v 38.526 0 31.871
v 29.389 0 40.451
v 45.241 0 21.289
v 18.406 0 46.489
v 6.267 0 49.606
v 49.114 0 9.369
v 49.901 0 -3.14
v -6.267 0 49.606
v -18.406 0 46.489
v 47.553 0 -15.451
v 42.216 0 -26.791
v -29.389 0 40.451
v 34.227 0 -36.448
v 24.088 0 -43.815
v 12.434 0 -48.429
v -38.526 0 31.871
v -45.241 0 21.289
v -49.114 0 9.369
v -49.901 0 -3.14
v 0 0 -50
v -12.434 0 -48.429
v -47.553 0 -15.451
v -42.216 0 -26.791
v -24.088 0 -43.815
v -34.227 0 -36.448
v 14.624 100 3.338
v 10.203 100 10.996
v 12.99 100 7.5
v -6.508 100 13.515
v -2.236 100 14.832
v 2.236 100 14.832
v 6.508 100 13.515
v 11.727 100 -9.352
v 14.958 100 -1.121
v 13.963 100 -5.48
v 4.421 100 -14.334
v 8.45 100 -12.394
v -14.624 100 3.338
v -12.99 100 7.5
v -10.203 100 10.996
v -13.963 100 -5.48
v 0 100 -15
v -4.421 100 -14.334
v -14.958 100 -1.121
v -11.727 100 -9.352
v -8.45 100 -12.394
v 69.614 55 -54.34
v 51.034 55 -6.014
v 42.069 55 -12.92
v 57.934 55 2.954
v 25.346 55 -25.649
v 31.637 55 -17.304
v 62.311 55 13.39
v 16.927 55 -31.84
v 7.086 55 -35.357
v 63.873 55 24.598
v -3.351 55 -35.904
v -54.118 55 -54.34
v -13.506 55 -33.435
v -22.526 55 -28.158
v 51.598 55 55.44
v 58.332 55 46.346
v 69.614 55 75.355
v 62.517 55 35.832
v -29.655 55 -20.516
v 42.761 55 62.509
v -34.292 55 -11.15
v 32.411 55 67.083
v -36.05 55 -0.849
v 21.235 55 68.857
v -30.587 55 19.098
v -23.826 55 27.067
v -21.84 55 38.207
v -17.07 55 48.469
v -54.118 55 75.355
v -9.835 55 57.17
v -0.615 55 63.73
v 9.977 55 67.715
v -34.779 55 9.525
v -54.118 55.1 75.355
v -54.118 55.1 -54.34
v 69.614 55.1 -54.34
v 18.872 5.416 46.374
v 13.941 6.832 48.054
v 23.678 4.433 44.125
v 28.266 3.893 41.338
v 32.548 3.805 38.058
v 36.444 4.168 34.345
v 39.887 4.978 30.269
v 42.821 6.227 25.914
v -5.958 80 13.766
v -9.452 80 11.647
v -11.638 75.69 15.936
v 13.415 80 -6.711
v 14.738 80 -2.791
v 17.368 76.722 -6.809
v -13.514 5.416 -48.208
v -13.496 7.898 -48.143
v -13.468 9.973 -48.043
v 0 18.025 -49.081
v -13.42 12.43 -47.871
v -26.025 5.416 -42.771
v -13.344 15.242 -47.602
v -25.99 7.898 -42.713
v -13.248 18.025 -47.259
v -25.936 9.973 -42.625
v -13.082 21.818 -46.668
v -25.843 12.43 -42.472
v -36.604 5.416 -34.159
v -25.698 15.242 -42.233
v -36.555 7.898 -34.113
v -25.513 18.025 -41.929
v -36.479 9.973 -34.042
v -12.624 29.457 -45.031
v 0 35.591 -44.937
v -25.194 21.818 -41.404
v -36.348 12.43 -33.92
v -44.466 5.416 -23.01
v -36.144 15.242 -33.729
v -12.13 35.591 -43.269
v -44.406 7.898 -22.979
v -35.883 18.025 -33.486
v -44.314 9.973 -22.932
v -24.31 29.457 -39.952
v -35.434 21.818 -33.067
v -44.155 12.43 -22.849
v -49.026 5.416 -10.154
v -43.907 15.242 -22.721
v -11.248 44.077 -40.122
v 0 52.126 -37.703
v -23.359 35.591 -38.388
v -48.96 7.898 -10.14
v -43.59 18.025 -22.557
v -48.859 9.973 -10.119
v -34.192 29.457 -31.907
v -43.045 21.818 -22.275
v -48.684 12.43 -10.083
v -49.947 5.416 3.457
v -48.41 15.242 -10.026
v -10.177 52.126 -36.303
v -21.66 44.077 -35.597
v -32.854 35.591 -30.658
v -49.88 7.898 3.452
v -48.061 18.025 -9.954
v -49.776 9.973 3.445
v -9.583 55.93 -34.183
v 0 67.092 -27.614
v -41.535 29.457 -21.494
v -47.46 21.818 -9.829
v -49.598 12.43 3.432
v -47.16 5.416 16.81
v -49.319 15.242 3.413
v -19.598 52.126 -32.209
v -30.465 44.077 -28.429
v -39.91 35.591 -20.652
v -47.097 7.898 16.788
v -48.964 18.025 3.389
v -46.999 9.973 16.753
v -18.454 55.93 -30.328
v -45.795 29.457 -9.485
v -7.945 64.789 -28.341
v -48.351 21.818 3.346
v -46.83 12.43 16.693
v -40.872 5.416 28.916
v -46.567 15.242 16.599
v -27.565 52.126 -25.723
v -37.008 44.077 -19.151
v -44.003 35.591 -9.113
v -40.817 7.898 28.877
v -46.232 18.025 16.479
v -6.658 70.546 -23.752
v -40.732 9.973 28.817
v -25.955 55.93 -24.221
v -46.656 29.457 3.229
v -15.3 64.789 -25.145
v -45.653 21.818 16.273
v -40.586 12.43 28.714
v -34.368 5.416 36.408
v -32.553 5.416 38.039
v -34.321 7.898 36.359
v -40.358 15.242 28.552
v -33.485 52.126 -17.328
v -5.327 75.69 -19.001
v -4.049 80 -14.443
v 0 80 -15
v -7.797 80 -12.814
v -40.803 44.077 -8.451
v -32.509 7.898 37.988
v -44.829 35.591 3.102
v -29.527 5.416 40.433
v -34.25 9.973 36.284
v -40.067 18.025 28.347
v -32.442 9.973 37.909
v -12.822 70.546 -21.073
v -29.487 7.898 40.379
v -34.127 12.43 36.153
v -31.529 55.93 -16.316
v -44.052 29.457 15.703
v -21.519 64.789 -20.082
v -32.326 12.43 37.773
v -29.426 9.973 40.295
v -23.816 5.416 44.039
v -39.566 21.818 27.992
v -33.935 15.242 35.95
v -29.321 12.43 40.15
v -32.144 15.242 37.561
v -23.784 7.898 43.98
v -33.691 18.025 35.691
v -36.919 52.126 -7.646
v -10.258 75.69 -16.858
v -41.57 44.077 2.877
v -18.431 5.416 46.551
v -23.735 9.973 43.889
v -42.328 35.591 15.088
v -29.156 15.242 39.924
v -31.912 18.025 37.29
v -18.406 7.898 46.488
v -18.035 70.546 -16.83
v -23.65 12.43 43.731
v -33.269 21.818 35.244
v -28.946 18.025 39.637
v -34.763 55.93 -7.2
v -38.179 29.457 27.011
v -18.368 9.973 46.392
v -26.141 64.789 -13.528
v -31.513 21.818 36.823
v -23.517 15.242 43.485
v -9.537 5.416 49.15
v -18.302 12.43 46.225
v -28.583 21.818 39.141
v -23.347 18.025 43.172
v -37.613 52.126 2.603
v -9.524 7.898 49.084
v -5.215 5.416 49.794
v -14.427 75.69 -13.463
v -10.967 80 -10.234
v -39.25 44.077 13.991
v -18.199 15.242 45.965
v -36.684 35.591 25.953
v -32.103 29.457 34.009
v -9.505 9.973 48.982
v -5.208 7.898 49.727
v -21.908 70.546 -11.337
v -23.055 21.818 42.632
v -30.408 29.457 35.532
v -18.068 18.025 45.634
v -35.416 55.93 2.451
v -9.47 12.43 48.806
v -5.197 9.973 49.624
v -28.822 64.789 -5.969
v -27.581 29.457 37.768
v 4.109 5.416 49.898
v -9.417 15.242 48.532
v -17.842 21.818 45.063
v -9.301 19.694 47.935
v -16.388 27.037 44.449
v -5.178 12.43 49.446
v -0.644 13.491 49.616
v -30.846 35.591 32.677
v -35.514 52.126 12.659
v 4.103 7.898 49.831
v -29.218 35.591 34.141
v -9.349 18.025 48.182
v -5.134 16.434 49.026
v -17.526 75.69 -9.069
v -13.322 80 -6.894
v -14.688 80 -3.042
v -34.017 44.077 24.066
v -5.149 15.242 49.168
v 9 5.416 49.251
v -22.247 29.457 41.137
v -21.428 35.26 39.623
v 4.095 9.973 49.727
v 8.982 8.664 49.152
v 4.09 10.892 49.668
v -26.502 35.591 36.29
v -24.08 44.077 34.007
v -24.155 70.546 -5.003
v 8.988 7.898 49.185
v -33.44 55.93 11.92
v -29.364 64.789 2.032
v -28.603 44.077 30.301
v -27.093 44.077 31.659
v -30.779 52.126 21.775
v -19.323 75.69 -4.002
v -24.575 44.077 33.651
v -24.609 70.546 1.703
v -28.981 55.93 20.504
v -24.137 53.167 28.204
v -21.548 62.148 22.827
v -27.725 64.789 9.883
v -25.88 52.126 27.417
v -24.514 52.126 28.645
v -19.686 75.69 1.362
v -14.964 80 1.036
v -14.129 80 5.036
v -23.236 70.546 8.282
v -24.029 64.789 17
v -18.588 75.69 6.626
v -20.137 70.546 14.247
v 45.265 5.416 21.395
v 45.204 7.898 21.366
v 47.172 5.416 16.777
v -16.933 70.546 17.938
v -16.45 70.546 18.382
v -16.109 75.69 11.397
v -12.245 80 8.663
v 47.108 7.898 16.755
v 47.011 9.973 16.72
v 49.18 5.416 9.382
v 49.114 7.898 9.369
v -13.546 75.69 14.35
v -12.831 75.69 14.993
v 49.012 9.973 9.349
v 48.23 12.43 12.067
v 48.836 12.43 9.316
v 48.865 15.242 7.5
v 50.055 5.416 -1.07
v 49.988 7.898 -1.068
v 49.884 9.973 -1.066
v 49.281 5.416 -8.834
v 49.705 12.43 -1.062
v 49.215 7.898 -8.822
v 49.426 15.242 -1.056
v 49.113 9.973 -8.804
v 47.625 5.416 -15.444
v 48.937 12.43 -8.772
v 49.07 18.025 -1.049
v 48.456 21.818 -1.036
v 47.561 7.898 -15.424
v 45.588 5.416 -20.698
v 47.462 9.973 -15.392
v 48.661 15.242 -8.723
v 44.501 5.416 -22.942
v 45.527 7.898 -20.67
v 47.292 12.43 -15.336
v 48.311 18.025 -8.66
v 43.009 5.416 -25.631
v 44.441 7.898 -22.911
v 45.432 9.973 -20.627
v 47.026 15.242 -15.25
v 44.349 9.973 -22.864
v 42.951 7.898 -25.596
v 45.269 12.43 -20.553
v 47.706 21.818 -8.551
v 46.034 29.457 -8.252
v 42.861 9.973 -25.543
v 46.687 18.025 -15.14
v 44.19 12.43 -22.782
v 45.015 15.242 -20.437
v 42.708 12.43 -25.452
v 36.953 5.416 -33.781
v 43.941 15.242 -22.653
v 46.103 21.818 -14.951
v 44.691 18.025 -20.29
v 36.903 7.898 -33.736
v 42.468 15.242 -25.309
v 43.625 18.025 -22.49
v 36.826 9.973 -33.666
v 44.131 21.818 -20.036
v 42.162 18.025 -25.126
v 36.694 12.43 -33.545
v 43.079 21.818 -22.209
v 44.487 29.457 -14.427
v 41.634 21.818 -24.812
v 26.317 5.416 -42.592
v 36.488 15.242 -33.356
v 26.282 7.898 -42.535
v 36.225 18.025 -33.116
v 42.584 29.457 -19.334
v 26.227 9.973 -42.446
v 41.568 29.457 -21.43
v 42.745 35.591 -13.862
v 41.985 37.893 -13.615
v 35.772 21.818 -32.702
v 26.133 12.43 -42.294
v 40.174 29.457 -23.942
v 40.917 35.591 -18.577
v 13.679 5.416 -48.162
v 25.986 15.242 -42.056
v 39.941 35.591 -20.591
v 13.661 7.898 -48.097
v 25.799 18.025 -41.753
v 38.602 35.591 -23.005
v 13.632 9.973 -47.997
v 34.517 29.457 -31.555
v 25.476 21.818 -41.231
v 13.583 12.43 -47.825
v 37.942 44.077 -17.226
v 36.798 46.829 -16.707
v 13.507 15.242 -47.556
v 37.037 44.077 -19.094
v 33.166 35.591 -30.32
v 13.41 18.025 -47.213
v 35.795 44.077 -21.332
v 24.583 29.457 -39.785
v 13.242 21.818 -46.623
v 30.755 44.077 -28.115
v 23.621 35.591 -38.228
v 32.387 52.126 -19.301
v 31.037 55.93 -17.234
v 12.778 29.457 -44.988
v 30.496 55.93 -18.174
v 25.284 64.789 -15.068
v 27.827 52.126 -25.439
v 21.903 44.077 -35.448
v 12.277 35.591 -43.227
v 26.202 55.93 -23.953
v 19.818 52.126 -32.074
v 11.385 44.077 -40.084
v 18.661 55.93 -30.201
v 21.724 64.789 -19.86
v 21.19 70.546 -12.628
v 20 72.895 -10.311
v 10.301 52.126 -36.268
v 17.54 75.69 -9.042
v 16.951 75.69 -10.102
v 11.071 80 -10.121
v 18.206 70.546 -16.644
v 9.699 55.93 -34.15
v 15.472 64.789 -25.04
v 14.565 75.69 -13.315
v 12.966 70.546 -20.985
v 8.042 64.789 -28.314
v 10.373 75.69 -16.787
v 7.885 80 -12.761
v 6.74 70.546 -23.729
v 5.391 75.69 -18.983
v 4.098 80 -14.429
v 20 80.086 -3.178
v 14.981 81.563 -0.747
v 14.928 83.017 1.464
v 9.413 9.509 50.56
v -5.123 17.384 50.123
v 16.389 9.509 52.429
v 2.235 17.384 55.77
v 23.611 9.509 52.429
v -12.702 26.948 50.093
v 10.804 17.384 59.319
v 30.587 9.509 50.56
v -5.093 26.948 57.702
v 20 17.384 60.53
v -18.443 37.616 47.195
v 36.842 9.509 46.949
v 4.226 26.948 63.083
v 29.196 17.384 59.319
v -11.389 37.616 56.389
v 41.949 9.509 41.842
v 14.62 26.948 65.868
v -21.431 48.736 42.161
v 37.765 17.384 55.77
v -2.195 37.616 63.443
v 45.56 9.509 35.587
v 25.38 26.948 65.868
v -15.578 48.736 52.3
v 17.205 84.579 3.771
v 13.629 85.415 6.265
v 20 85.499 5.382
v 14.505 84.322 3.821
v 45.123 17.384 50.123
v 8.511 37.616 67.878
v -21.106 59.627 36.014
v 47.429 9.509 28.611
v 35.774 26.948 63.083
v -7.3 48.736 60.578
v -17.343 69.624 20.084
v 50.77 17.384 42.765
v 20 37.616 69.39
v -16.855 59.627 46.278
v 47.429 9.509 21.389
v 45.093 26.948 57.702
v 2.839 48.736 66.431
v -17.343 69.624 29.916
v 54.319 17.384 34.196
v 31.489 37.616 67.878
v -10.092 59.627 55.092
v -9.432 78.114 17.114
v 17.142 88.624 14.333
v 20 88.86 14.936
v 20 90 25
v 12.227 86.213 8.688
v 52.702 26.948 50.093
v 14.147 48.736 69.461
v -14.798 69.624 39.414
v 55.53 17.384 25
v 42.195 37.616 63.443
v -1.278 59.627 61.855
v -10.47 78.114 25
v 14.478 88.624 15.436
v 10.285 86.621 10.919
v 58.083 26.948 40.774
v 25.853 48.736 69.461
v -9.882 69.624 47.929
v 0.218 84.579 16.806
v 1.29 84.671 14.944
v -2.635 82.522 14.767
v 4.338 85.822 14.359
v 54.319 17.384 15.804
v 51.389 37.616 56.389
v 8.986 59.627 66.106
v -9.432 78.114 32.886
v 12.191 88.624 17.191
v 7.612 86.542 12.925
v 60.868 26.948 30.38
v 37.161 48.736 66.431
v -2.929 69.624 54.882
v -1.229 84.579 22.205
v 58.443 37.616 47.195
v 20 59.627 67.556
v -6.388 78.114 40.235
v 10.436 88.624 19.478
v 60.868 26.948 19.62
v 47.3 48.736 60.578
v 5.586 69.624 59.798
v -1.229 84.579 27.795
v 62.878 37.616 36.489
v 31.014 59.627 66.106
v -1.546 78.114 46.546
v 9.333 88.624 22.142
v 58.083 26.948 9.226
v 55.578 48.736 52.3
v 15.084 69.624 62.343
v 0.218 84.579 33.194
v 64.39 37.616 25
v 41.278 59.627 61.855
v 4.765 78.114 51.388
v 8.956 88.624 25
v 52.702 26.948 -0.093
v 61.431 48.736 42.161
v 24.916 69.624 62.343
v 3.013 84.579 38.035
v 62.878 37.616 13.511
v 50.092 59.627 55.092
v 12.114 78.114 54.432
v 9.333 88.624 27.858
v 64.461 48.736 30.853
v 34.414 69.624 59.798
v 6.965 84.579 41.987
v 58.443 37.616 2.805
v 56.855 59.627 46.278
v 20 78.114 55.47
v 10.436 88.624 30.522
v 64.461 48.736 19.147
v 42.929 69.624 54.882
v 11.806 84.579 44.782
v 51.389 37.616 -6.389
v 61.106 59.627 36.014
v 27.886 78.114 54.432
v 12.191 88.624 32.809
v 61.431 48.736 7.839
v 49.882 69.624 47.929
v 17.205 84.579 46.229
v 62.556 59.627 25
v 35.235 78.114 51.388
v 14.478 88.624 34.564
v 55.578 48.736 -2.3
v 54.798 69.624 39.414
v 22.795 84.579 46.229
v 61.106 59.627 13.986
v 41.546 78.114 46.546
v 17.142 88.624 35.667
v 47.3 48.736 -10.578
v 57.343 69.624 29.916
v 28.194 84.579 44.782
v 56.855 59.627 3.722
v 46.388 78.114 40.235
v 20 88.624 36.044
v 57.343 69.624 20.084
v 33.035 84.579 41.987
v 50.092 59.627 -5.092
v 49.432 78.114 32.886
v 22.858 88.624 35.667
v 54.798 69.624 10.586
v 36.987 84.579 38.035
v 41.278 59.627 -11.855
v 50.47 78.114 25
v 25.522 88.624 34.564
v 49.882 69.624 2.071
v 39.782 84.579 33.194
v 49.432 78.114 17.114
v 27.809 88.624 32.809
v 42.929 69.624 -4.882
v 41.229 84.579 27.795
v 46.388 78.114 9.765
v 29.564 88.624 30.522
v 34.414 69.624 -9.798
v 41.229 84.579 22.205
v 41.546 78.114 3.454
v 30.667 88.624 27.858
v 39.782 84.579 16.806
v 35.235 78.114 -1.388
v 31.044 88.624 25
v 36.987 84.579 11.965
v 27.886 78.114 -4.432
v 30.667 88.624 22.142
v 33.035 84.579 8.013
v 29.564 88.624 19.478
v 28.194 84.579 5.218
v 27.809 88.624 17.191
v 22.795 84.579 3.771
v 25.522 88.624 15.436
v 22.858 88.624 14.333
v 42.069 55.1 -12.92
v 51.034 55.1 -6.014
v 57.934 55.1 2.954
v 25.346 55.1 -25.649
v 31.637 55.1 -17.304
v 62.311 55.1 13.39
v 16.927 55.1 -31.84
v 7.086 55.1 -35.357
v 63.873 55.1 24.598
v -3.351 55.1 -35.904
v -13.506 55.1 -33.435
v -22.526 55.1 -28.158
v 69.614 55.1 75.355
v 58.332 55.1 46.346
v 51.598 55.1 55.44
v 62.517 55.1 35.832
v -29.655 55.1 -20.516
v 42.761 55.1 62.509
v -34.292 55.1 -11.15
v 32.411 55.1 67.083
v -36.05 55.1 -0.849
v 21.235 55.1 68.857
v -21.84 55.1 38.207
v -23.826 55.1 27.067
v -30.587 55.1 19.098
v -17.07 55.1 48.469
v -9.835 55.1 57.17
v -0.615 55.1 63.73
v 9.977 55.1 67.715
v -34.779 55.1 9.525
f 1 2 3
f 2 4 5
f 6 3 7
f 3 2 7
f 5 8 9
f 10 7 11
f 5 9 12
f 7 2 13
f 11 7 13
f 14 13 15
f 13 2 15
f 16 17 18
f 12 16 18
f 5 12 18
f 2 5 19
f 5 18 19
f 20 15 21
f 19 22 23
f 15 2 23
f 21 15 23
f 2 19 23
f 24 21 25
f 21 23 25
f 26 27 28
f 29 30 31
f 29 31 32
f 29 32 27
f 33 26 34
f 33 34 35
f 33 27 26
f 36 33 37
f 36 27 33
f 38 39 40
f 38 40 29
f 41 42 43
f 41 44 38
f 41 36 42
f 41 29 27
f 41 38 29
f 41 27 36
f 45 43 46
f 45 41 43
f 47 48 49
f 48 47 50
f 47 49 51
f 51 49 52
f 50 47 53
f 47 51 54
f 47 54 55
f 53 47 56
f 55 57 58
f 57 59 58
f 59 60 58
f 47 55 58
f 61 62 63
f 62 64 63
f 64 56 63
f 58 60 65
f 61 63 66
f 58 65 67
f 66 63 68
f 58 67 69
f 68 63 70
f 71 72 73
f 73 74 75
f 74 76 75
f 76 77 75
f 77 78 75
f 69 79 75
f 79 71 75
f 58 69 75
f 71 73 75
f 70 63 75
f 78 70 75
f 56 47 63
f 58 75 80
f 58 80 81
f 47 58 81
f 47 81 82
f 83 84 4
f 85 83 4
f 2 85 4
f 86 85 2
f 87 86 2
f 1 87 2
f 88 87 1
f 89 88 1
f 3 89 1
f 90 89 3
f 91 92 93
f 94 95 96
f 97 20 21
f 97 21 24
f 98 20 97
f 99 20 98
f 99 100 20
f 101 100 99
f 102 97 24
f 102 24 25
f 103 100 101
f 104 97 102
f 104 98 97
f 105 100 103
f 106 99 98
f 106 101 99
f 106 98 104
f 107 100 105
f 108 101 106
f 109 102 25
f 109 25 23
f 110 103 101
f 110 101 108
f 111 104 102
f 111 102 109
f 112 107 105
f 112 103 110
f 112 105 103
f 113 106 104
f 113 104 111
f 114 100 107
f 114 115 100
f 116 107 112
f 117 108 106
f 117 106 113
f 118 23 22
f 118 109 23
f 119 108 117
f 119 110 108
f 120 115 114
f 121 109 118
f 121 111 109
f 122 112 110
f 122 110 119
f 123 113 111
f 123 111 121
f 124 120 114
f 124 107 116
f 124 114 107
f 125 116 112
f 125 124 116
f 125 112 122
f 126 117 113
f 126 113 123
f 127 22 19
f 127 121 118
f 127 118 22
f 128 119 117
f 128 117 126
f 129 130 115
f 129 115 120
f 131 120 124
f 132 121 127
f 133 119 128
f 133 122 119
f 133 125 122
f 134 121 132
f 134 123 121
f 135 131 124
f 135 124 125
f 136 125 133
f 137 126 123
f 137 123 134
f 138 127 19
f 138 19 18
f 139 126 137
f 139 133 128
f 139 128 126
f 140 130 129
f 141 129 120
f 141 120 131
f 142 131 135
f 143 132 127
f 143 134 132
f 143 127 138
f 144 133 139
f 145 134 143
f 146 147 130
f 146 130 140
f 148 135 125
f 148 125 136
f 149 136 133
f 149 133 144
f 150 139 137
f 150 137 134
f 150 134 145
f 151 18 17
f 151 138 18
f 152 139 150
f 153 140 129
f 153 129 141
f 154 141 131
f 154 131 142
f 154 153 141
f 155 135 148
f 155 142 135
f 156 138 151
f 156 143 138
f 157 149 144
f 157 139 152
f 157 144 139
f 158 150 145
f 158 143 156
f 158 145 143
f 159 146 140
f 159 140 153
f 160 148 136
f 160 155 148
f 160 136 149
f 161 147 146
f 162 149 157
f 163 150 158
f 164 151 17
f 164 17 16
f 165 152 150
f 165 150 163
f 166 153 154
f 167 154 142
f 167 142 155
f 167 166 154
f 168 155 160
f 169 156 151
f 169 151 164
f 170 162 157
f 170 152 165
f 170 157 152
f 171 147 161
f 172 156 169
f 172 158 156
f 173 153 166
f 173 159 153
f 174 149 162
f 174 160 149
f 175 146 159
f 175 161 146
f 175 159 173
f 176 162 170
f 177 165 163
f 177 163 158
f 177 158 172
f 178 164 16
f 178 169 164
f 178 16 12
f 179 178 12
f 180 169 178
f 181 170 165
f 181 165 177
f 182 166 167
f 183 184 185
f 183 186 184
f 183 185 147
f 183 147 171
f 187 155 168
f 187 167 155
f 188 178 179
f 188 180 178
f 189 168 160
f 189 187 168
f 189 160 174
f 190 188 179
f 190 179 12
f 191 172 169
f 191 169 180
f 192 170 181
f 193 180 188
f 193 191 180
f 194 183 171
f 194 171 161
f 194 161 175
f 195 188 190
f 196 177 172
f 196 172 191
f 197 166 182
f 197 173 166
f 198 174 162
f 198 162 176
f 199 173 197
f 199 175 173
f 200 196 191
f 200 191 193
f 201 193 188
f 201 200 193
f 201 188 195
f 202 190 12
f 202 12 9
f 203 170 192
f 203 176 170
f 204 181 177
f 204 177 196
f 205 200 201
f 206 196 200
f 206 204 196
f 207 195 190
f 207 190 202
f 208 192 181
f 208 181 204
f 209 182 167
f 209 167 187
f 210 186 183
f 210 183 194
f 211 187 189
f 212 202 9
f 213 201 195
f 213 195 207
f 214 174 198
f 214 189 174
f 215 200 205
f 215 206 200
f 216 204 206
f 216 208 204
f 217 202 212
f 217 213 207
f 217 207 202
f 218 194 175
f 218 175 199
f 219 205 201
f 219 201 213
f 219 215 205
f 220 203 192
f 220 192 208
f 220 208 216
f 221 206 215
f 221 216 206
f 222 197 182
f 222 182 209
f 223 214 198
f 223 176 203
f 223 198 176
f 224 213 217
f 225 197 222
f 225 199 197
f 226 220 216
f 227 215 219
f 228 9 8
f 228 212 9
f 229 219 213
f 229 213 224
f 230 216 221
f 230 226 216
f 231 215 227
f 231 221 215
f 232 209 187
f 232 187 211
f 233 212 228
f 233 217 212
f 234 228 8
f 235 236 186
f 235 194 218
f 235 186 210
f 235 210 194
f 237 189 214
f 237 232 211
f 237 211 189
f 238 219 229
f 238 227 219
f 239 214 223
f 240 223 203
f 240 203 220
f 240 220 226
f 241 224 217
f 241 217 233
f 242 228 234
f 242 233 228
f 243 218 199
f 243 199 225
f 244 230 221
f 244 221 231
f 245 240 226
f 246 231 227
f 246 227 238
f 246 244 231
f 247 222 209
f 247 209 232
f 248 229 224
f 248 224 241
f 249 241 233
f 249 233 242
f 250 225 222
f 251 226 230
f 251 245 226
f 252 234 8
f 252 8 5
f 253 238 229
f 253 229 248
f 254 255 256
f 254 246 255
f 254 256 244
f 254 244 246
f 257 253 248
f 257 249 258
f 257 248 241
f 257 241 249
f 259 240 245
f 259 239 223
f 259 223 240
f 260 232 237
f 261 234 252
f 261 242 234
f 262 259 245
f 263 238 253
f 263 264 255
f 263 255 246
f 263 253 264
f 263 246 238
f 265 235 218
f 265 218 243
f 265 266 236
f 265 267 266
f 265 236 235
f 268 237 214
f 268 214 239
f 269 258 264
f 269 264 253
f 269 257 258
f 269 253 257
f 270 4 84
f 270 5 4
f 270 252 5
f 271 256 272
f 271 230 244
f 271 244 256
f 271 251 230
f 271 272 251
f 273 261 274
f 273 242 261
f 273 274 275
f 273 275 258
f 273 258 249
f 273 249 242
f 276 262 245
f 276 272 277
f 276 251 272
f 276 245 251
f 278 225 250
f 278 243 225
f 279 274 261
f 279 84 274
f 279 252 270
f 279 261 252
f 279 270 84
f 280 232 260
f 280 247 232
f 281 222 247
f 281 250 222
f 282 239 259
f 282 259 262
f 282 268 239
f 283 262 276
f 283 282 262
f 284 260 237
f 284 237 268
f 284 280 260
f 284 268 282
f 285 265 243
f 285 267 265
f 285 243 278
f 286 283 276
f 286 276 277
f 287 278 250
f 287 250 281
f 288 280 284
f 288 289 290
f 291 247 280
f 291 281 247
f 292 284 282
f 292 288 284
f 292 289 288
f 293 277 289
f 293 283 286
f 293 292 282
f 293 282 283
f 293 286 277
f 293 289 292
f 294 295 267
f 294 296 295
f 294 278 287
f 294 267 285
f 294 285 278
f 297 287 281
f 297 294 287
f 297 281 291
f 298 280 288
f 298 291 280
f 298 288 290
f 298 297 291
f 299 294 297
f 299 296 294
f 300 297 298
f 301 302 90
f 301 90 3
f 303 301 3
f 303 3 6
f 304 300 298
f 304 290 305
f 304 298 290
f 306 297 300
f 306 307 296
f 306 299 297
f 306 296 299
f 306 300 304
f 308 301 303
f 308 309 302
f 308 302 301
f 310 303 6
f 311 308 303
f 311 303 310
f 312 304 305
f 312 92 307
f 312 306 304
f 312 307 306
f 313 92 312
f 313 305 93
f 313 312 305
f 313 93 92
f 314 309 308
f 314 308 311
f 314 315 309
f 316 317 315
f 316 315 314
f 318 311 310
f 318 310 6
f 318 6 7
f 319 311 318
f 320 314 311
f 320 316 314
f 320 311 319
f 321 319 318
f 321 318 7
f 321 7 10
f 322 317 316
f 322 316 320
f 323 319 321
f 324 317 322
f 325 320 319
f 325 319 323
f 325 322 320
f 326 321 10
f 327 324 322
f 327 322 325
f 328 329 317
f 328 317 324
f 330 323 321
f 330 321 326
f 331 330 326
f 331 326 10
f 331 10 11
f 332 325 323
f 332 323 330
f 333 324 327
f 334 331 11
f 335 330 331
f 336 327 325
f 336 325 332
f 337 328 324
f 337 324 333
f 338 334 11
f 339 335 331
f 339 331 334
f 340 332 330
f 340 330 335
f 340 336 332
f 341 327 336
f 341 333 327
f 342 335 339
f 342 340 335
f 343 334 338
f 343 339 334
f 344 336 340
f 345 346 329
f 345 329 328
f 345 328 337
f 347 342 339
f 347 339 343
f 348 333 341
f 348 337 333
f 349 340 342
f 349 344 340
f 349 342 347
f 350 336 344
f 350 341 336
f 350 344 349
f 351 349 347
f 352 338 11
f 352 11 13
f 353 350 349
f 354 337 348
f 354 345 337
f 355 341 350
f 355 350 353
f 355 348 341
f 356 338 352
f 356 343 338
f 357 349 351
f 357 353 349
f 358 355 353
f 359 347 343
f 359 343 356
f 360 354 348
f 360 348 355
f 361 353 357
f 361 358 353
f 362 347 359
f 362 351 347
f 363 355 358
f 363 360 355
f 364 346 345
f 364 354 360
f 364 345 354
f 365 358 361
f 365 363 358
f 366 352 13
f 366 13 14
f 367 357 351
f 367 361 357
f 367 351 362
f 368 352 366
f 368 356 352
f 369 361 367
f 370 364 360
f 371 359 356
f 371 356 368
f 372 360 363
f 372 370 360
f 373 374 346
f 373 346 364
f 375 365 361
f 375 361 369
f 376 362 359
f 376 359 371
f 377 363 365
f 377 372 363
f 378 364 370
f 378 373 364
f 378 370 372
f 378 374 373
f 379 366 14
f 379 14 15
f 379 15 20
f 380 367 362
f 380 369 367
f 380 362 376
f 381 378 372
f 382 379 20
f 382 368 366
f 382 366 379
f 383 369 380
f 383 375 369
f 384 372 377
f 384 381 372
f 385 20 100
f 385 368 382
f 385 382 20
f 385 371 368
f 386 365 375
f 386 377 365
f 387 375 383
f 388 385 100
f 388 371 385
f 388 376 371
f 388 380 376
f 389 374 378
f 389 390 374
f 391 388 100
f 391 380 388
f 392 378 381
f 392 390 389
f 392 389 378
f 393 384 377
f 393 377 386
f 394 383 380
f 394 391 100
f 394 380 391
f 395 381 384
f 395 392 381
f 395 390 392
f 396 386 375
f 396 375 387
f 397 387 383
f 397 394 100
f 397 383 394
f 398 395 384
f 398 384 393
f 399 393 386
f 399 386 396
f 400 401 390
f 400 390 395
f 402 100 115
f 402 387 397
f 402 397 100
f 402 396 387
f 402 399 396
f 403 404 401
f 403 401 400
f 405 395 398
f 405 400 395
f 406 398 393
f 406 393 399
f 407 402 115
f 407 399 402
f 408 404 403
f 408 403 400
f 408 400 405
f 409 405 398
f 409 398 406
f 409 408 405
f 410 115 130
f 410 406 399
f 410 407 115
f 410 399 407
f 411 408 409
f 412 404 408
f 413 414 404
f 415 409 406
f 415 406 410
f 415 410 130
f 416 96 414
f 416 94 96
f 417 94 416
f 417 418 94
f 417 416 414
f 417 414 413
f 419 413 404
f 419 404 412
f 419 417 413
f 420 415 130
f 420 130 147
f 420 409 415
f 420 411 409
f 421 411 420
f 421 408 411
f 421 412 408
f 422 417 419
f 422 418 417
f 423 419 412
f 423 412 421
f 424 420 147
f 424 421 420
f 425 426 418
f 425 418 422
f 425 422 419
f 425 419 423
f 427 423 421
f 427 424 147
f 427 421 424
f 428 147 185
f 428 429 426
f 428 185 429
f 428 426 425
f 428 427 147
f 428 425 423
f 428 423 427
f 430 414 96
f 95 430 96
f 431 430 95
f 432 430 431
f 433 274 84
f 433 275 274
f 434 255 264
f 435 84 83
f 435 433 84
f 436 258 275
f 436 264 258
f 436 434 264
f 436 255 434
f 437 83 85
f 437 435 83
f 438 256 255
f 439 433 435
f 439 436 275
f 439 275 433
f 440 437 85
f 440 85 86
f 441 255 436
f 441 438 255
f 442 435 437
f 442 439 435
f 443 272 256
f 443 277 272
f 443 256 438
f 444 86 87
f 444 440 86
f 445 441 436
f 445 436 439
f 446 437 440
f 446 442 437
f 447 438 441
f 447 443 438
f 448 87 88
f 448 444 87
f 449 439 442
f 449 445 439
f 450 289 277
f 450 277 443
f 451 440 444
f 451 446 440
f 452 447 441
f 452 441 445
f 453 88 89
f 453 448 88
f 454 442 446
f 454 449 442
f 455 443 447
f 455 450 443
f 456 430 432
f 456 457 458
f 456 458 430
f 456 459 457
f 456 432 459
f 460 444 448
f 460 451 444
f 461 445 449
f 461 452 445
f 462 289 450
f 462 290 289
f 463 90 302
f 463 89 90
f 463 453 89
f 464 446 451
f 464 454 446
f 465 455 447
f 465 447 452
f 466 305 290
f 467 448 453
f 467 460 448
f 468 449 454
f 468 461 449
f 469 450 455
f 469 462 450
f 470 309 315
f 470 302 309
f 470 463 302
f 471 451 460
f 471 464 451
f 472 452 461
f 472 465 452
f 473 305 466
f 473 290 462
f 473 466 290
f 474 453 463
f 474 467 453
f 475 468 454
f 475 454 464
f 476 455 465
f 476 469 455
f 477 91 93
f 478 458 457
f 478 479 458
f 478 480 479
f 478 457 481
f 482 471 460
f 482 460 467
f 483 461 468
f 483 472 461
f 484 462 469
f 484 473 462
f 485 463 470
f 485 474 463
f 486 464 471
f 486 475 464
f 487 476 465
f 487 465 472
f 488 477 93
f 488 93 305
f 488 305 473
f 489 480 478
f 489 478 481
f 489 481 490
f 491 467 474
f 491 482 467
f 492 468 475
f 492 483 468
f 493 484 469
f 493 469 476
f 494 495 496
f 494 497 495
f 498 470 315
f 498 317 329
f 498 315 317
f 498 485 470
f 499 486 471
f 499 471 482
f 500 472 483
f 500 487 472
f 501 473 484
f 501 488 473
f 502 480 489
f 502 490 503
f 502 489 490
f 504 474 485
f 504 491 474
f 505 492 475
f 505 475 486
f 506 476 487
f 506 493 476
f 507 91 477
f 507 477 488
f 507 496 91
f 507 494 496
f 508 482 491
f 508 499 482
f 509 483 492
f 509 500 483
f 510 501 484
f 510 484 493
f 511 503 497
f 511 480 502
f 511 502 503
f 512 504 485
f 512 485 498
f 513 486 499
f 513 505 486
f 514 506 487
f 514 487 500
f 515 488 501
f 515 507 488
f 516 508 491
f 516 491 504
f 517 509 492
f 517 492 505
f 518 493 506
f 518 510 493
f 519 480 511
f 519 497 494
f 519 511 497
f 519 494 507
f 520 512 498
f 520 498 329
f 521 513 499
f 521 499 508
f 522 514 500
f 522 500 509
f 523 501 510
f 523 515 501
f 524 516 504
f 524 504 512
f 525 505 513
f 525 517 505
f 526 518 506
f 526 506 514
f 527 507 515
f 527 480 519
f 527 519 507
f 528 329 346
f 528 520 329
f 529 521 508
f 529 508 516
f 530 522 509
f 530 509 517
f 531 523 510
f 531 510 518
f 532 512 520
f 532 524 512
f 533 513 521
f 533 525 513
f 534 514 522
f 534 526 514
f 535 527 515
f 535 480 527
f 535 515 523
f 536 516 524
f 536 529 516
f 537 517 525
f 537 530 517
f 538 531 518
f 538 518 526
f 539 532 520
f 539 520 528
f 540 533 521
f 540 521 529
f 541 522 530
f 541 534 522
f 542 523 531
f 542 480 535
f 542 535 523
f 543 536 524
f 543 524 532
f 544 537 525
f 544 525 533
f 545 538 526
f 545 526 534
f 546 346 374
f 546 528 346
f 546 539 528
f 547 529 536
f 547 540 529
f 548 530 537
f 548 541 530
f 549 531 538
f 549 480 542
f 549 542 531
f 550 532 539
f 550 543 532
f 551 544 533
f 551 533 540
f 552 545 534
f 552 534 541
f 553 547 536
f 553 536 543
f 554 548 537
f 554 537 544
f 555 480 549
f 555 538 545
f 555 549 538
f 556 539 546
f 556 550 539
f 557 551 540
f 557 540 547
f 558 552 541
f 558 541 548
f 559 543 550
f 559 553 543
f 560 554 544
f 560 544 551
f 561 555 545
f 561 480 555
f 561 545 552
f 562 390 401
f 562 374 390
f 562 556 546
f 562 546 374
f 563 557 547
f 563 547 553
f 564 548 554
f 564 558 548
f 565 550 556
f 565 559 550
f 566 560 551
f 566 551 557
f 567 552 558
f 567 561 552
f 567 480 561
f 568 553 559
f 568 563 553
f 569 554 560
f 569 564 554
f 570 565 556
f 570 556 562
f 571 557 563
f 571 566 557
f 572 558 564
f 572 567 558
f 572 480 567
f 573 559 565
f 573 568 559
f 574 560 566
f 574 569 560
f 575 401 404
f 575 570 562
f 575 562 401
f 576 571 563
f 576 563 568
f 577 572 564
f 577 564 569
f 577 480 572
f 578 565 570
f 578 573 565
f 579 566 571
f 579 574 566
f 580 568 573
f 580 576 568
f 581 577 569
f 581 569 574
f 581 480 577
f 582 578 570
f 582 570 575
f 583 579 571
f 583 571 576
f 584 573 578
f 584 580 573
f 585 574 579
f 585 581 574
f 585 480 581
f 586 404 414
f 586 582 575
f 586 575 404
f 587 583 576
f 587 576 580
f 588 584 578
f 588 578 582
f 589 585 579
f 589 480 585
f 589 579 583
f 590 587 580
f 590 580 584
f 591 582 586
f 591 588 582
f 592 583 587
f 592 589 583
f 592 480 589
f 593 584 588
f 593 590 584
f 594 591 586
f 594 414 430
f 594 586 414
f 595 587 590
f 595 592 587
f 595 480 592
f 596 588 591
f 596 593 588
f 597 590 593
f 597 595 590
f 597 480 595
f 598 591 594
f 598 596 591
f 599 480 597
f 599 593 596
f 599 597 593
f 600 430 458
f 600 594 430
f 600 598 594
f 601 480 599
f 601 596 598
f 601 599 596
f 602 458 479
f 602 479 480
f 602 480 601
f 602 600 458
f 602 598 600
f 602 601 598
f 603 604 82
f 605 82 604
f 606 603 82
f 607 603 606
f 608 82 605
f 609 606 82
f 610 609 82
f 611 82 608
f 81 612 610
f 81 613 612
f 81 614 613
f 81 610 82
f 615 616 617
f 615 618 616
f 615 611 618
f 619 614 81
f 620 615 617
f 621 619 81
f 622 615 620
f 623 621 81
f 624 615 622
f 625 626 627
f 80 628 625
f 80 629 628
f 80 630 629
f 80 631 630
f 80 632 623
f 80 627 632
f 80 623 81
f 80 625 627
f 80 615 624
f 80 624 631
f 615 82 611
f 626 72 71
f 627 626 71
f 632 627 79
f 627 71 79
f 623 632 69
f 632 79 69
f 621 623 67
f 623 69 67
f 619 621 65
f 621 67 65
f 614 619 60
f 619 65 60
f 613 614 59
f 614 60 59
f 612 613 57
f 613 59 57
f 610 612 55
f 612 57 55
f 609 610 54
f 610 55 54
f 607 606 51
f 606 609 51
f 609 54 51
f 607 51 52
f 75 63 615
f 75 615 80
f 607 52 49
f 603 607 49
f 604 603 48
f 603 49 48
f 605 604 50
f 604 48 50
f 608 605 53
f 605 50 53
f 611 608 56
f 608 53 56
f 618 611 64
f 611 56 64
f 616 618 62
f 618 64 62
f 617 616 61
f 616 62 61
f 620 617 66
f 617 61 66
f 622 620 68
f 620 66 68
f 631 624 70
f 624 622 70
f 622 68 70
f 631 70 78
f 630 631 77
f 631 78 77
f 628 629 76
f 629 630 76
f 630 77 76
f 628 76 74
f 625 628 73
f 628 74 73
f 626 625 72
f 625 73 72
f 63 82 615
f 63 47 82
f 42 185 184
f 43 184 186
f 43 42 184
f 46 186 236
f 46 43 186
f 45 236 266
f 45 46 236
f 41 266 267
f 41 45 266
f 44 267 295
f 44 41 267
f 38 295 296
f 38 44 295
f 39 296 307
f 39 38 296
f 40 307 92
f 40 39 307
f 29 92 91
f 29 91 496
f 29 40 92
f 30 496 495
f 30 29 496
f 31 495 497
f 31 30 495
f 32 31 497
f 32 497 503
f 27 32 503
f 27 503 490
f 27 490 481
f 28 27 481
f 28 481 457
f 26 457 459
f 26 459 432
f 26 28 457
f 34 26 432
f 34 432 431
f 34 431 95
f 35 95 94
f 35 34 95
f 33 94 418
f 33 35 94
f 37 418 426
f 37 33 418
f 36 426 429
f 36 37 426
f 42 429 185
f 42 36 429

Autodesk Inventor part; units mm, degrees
ref_plane "XY Plane" through (0, 0, 0) normal (0, 0, 1) x (1, 0, 0)
sketch "Эскиз1" plane through (0, 0, 0) normal (1, 0, 0) x (0, 1, 0)
  line L0 (0, 0) -> (0, -50)
  line L1 (80, 0) -> (80, -15)
  line L2 (80, -15) -> (100, -15)
  line L3 (100, -15) -> (100, 0)
  line L4 (0, 0) -> (80, 0)
  arc A0 (0, -50) -> (80, -15) centre (3.9402, 49.9223) ccw
  line L5 (100, 0) -> (80, 0)
  dimension "d0" = 50
  dimension "d2" = 15
  dimension "d3" = 20
  dimension "d4" = 100
revolve "Вращение1" add sketch "Эскиз1" angle 360 about axis through (0, 0, 0) along (0, 1, 0)
ref_plane "РабПлоскость1" through (20, 0, 0) normal (1, 0, 0) x (0, 1, 0)
sketch "Эскиз2" plane through (20, 0, 0) normal (1, 0, 0) x (0, 1, 0)
  line L0 (80, -15) -> (80, 15) projected
  line L1 (0, -50) -> (0, 50) projected
  line L2 (0, 25) -> (45, 25)
  arc A0 (0, 25) -> (90, 25) centre (45, 25) ccw
  line L3 (0, 25) -> (90, 25)
  point P0 (0, 0)
revolve "Вращение2" add sketch "Эскиз2" angle 360 about axis through (20, 0, 25) along (0, 1, 0)
ref_plane "РабПлоскость2" through (0, 55, 0) normal (0, 1, 0) x (-1, 0, 0)
split_face "Разделение1"
sketch "Эскиз3" plane through (0, 55, 0) normal (0, 1, 0) x (-1, 0, 0)
  point P0 (0, 0)
sketch "Эскиз4" plane through (0, 55, 0) normal (0, 1, 0) x (-1, 0, 0)
  arc A0 (-31.6368, -17.3035) -> (23.8261, 27.0668) centre (0, 0) ccw projected
  arc A1 (23.8261, 27.0668) -> (-31.6368, -17.3035) centre (-20, 25) ccw projected
  arc A2 (-31.6368, -17.3035) -> (23.8261, 27.0668) centre (0, 0) ccw projected
  arc A3 (-14.7381, -2.7905) -> (5.9577, 13.7661) centre (0, 0) ccw projected
  line L0 (54.1182, 75.3546) -> (54.1182, -54.3405)
  line L1 (54.1182, -54.3405) -> (-69.6139, -54.3405)
  line L2 (-69.6139, -54.3405) -> (-69.6139, 75.3546)
  line L3 (-69.6139, 75.3546) -> (54.1182, 75.3546)
  point P0 (23.8261, 27.0668)
  point P1 (-31.6368, -17.3035)
extrude "Выдавливание1" add sketch "Эскиз4" along normal blind 0.1 separate body
properties part number "Друк 521703 lab2"
